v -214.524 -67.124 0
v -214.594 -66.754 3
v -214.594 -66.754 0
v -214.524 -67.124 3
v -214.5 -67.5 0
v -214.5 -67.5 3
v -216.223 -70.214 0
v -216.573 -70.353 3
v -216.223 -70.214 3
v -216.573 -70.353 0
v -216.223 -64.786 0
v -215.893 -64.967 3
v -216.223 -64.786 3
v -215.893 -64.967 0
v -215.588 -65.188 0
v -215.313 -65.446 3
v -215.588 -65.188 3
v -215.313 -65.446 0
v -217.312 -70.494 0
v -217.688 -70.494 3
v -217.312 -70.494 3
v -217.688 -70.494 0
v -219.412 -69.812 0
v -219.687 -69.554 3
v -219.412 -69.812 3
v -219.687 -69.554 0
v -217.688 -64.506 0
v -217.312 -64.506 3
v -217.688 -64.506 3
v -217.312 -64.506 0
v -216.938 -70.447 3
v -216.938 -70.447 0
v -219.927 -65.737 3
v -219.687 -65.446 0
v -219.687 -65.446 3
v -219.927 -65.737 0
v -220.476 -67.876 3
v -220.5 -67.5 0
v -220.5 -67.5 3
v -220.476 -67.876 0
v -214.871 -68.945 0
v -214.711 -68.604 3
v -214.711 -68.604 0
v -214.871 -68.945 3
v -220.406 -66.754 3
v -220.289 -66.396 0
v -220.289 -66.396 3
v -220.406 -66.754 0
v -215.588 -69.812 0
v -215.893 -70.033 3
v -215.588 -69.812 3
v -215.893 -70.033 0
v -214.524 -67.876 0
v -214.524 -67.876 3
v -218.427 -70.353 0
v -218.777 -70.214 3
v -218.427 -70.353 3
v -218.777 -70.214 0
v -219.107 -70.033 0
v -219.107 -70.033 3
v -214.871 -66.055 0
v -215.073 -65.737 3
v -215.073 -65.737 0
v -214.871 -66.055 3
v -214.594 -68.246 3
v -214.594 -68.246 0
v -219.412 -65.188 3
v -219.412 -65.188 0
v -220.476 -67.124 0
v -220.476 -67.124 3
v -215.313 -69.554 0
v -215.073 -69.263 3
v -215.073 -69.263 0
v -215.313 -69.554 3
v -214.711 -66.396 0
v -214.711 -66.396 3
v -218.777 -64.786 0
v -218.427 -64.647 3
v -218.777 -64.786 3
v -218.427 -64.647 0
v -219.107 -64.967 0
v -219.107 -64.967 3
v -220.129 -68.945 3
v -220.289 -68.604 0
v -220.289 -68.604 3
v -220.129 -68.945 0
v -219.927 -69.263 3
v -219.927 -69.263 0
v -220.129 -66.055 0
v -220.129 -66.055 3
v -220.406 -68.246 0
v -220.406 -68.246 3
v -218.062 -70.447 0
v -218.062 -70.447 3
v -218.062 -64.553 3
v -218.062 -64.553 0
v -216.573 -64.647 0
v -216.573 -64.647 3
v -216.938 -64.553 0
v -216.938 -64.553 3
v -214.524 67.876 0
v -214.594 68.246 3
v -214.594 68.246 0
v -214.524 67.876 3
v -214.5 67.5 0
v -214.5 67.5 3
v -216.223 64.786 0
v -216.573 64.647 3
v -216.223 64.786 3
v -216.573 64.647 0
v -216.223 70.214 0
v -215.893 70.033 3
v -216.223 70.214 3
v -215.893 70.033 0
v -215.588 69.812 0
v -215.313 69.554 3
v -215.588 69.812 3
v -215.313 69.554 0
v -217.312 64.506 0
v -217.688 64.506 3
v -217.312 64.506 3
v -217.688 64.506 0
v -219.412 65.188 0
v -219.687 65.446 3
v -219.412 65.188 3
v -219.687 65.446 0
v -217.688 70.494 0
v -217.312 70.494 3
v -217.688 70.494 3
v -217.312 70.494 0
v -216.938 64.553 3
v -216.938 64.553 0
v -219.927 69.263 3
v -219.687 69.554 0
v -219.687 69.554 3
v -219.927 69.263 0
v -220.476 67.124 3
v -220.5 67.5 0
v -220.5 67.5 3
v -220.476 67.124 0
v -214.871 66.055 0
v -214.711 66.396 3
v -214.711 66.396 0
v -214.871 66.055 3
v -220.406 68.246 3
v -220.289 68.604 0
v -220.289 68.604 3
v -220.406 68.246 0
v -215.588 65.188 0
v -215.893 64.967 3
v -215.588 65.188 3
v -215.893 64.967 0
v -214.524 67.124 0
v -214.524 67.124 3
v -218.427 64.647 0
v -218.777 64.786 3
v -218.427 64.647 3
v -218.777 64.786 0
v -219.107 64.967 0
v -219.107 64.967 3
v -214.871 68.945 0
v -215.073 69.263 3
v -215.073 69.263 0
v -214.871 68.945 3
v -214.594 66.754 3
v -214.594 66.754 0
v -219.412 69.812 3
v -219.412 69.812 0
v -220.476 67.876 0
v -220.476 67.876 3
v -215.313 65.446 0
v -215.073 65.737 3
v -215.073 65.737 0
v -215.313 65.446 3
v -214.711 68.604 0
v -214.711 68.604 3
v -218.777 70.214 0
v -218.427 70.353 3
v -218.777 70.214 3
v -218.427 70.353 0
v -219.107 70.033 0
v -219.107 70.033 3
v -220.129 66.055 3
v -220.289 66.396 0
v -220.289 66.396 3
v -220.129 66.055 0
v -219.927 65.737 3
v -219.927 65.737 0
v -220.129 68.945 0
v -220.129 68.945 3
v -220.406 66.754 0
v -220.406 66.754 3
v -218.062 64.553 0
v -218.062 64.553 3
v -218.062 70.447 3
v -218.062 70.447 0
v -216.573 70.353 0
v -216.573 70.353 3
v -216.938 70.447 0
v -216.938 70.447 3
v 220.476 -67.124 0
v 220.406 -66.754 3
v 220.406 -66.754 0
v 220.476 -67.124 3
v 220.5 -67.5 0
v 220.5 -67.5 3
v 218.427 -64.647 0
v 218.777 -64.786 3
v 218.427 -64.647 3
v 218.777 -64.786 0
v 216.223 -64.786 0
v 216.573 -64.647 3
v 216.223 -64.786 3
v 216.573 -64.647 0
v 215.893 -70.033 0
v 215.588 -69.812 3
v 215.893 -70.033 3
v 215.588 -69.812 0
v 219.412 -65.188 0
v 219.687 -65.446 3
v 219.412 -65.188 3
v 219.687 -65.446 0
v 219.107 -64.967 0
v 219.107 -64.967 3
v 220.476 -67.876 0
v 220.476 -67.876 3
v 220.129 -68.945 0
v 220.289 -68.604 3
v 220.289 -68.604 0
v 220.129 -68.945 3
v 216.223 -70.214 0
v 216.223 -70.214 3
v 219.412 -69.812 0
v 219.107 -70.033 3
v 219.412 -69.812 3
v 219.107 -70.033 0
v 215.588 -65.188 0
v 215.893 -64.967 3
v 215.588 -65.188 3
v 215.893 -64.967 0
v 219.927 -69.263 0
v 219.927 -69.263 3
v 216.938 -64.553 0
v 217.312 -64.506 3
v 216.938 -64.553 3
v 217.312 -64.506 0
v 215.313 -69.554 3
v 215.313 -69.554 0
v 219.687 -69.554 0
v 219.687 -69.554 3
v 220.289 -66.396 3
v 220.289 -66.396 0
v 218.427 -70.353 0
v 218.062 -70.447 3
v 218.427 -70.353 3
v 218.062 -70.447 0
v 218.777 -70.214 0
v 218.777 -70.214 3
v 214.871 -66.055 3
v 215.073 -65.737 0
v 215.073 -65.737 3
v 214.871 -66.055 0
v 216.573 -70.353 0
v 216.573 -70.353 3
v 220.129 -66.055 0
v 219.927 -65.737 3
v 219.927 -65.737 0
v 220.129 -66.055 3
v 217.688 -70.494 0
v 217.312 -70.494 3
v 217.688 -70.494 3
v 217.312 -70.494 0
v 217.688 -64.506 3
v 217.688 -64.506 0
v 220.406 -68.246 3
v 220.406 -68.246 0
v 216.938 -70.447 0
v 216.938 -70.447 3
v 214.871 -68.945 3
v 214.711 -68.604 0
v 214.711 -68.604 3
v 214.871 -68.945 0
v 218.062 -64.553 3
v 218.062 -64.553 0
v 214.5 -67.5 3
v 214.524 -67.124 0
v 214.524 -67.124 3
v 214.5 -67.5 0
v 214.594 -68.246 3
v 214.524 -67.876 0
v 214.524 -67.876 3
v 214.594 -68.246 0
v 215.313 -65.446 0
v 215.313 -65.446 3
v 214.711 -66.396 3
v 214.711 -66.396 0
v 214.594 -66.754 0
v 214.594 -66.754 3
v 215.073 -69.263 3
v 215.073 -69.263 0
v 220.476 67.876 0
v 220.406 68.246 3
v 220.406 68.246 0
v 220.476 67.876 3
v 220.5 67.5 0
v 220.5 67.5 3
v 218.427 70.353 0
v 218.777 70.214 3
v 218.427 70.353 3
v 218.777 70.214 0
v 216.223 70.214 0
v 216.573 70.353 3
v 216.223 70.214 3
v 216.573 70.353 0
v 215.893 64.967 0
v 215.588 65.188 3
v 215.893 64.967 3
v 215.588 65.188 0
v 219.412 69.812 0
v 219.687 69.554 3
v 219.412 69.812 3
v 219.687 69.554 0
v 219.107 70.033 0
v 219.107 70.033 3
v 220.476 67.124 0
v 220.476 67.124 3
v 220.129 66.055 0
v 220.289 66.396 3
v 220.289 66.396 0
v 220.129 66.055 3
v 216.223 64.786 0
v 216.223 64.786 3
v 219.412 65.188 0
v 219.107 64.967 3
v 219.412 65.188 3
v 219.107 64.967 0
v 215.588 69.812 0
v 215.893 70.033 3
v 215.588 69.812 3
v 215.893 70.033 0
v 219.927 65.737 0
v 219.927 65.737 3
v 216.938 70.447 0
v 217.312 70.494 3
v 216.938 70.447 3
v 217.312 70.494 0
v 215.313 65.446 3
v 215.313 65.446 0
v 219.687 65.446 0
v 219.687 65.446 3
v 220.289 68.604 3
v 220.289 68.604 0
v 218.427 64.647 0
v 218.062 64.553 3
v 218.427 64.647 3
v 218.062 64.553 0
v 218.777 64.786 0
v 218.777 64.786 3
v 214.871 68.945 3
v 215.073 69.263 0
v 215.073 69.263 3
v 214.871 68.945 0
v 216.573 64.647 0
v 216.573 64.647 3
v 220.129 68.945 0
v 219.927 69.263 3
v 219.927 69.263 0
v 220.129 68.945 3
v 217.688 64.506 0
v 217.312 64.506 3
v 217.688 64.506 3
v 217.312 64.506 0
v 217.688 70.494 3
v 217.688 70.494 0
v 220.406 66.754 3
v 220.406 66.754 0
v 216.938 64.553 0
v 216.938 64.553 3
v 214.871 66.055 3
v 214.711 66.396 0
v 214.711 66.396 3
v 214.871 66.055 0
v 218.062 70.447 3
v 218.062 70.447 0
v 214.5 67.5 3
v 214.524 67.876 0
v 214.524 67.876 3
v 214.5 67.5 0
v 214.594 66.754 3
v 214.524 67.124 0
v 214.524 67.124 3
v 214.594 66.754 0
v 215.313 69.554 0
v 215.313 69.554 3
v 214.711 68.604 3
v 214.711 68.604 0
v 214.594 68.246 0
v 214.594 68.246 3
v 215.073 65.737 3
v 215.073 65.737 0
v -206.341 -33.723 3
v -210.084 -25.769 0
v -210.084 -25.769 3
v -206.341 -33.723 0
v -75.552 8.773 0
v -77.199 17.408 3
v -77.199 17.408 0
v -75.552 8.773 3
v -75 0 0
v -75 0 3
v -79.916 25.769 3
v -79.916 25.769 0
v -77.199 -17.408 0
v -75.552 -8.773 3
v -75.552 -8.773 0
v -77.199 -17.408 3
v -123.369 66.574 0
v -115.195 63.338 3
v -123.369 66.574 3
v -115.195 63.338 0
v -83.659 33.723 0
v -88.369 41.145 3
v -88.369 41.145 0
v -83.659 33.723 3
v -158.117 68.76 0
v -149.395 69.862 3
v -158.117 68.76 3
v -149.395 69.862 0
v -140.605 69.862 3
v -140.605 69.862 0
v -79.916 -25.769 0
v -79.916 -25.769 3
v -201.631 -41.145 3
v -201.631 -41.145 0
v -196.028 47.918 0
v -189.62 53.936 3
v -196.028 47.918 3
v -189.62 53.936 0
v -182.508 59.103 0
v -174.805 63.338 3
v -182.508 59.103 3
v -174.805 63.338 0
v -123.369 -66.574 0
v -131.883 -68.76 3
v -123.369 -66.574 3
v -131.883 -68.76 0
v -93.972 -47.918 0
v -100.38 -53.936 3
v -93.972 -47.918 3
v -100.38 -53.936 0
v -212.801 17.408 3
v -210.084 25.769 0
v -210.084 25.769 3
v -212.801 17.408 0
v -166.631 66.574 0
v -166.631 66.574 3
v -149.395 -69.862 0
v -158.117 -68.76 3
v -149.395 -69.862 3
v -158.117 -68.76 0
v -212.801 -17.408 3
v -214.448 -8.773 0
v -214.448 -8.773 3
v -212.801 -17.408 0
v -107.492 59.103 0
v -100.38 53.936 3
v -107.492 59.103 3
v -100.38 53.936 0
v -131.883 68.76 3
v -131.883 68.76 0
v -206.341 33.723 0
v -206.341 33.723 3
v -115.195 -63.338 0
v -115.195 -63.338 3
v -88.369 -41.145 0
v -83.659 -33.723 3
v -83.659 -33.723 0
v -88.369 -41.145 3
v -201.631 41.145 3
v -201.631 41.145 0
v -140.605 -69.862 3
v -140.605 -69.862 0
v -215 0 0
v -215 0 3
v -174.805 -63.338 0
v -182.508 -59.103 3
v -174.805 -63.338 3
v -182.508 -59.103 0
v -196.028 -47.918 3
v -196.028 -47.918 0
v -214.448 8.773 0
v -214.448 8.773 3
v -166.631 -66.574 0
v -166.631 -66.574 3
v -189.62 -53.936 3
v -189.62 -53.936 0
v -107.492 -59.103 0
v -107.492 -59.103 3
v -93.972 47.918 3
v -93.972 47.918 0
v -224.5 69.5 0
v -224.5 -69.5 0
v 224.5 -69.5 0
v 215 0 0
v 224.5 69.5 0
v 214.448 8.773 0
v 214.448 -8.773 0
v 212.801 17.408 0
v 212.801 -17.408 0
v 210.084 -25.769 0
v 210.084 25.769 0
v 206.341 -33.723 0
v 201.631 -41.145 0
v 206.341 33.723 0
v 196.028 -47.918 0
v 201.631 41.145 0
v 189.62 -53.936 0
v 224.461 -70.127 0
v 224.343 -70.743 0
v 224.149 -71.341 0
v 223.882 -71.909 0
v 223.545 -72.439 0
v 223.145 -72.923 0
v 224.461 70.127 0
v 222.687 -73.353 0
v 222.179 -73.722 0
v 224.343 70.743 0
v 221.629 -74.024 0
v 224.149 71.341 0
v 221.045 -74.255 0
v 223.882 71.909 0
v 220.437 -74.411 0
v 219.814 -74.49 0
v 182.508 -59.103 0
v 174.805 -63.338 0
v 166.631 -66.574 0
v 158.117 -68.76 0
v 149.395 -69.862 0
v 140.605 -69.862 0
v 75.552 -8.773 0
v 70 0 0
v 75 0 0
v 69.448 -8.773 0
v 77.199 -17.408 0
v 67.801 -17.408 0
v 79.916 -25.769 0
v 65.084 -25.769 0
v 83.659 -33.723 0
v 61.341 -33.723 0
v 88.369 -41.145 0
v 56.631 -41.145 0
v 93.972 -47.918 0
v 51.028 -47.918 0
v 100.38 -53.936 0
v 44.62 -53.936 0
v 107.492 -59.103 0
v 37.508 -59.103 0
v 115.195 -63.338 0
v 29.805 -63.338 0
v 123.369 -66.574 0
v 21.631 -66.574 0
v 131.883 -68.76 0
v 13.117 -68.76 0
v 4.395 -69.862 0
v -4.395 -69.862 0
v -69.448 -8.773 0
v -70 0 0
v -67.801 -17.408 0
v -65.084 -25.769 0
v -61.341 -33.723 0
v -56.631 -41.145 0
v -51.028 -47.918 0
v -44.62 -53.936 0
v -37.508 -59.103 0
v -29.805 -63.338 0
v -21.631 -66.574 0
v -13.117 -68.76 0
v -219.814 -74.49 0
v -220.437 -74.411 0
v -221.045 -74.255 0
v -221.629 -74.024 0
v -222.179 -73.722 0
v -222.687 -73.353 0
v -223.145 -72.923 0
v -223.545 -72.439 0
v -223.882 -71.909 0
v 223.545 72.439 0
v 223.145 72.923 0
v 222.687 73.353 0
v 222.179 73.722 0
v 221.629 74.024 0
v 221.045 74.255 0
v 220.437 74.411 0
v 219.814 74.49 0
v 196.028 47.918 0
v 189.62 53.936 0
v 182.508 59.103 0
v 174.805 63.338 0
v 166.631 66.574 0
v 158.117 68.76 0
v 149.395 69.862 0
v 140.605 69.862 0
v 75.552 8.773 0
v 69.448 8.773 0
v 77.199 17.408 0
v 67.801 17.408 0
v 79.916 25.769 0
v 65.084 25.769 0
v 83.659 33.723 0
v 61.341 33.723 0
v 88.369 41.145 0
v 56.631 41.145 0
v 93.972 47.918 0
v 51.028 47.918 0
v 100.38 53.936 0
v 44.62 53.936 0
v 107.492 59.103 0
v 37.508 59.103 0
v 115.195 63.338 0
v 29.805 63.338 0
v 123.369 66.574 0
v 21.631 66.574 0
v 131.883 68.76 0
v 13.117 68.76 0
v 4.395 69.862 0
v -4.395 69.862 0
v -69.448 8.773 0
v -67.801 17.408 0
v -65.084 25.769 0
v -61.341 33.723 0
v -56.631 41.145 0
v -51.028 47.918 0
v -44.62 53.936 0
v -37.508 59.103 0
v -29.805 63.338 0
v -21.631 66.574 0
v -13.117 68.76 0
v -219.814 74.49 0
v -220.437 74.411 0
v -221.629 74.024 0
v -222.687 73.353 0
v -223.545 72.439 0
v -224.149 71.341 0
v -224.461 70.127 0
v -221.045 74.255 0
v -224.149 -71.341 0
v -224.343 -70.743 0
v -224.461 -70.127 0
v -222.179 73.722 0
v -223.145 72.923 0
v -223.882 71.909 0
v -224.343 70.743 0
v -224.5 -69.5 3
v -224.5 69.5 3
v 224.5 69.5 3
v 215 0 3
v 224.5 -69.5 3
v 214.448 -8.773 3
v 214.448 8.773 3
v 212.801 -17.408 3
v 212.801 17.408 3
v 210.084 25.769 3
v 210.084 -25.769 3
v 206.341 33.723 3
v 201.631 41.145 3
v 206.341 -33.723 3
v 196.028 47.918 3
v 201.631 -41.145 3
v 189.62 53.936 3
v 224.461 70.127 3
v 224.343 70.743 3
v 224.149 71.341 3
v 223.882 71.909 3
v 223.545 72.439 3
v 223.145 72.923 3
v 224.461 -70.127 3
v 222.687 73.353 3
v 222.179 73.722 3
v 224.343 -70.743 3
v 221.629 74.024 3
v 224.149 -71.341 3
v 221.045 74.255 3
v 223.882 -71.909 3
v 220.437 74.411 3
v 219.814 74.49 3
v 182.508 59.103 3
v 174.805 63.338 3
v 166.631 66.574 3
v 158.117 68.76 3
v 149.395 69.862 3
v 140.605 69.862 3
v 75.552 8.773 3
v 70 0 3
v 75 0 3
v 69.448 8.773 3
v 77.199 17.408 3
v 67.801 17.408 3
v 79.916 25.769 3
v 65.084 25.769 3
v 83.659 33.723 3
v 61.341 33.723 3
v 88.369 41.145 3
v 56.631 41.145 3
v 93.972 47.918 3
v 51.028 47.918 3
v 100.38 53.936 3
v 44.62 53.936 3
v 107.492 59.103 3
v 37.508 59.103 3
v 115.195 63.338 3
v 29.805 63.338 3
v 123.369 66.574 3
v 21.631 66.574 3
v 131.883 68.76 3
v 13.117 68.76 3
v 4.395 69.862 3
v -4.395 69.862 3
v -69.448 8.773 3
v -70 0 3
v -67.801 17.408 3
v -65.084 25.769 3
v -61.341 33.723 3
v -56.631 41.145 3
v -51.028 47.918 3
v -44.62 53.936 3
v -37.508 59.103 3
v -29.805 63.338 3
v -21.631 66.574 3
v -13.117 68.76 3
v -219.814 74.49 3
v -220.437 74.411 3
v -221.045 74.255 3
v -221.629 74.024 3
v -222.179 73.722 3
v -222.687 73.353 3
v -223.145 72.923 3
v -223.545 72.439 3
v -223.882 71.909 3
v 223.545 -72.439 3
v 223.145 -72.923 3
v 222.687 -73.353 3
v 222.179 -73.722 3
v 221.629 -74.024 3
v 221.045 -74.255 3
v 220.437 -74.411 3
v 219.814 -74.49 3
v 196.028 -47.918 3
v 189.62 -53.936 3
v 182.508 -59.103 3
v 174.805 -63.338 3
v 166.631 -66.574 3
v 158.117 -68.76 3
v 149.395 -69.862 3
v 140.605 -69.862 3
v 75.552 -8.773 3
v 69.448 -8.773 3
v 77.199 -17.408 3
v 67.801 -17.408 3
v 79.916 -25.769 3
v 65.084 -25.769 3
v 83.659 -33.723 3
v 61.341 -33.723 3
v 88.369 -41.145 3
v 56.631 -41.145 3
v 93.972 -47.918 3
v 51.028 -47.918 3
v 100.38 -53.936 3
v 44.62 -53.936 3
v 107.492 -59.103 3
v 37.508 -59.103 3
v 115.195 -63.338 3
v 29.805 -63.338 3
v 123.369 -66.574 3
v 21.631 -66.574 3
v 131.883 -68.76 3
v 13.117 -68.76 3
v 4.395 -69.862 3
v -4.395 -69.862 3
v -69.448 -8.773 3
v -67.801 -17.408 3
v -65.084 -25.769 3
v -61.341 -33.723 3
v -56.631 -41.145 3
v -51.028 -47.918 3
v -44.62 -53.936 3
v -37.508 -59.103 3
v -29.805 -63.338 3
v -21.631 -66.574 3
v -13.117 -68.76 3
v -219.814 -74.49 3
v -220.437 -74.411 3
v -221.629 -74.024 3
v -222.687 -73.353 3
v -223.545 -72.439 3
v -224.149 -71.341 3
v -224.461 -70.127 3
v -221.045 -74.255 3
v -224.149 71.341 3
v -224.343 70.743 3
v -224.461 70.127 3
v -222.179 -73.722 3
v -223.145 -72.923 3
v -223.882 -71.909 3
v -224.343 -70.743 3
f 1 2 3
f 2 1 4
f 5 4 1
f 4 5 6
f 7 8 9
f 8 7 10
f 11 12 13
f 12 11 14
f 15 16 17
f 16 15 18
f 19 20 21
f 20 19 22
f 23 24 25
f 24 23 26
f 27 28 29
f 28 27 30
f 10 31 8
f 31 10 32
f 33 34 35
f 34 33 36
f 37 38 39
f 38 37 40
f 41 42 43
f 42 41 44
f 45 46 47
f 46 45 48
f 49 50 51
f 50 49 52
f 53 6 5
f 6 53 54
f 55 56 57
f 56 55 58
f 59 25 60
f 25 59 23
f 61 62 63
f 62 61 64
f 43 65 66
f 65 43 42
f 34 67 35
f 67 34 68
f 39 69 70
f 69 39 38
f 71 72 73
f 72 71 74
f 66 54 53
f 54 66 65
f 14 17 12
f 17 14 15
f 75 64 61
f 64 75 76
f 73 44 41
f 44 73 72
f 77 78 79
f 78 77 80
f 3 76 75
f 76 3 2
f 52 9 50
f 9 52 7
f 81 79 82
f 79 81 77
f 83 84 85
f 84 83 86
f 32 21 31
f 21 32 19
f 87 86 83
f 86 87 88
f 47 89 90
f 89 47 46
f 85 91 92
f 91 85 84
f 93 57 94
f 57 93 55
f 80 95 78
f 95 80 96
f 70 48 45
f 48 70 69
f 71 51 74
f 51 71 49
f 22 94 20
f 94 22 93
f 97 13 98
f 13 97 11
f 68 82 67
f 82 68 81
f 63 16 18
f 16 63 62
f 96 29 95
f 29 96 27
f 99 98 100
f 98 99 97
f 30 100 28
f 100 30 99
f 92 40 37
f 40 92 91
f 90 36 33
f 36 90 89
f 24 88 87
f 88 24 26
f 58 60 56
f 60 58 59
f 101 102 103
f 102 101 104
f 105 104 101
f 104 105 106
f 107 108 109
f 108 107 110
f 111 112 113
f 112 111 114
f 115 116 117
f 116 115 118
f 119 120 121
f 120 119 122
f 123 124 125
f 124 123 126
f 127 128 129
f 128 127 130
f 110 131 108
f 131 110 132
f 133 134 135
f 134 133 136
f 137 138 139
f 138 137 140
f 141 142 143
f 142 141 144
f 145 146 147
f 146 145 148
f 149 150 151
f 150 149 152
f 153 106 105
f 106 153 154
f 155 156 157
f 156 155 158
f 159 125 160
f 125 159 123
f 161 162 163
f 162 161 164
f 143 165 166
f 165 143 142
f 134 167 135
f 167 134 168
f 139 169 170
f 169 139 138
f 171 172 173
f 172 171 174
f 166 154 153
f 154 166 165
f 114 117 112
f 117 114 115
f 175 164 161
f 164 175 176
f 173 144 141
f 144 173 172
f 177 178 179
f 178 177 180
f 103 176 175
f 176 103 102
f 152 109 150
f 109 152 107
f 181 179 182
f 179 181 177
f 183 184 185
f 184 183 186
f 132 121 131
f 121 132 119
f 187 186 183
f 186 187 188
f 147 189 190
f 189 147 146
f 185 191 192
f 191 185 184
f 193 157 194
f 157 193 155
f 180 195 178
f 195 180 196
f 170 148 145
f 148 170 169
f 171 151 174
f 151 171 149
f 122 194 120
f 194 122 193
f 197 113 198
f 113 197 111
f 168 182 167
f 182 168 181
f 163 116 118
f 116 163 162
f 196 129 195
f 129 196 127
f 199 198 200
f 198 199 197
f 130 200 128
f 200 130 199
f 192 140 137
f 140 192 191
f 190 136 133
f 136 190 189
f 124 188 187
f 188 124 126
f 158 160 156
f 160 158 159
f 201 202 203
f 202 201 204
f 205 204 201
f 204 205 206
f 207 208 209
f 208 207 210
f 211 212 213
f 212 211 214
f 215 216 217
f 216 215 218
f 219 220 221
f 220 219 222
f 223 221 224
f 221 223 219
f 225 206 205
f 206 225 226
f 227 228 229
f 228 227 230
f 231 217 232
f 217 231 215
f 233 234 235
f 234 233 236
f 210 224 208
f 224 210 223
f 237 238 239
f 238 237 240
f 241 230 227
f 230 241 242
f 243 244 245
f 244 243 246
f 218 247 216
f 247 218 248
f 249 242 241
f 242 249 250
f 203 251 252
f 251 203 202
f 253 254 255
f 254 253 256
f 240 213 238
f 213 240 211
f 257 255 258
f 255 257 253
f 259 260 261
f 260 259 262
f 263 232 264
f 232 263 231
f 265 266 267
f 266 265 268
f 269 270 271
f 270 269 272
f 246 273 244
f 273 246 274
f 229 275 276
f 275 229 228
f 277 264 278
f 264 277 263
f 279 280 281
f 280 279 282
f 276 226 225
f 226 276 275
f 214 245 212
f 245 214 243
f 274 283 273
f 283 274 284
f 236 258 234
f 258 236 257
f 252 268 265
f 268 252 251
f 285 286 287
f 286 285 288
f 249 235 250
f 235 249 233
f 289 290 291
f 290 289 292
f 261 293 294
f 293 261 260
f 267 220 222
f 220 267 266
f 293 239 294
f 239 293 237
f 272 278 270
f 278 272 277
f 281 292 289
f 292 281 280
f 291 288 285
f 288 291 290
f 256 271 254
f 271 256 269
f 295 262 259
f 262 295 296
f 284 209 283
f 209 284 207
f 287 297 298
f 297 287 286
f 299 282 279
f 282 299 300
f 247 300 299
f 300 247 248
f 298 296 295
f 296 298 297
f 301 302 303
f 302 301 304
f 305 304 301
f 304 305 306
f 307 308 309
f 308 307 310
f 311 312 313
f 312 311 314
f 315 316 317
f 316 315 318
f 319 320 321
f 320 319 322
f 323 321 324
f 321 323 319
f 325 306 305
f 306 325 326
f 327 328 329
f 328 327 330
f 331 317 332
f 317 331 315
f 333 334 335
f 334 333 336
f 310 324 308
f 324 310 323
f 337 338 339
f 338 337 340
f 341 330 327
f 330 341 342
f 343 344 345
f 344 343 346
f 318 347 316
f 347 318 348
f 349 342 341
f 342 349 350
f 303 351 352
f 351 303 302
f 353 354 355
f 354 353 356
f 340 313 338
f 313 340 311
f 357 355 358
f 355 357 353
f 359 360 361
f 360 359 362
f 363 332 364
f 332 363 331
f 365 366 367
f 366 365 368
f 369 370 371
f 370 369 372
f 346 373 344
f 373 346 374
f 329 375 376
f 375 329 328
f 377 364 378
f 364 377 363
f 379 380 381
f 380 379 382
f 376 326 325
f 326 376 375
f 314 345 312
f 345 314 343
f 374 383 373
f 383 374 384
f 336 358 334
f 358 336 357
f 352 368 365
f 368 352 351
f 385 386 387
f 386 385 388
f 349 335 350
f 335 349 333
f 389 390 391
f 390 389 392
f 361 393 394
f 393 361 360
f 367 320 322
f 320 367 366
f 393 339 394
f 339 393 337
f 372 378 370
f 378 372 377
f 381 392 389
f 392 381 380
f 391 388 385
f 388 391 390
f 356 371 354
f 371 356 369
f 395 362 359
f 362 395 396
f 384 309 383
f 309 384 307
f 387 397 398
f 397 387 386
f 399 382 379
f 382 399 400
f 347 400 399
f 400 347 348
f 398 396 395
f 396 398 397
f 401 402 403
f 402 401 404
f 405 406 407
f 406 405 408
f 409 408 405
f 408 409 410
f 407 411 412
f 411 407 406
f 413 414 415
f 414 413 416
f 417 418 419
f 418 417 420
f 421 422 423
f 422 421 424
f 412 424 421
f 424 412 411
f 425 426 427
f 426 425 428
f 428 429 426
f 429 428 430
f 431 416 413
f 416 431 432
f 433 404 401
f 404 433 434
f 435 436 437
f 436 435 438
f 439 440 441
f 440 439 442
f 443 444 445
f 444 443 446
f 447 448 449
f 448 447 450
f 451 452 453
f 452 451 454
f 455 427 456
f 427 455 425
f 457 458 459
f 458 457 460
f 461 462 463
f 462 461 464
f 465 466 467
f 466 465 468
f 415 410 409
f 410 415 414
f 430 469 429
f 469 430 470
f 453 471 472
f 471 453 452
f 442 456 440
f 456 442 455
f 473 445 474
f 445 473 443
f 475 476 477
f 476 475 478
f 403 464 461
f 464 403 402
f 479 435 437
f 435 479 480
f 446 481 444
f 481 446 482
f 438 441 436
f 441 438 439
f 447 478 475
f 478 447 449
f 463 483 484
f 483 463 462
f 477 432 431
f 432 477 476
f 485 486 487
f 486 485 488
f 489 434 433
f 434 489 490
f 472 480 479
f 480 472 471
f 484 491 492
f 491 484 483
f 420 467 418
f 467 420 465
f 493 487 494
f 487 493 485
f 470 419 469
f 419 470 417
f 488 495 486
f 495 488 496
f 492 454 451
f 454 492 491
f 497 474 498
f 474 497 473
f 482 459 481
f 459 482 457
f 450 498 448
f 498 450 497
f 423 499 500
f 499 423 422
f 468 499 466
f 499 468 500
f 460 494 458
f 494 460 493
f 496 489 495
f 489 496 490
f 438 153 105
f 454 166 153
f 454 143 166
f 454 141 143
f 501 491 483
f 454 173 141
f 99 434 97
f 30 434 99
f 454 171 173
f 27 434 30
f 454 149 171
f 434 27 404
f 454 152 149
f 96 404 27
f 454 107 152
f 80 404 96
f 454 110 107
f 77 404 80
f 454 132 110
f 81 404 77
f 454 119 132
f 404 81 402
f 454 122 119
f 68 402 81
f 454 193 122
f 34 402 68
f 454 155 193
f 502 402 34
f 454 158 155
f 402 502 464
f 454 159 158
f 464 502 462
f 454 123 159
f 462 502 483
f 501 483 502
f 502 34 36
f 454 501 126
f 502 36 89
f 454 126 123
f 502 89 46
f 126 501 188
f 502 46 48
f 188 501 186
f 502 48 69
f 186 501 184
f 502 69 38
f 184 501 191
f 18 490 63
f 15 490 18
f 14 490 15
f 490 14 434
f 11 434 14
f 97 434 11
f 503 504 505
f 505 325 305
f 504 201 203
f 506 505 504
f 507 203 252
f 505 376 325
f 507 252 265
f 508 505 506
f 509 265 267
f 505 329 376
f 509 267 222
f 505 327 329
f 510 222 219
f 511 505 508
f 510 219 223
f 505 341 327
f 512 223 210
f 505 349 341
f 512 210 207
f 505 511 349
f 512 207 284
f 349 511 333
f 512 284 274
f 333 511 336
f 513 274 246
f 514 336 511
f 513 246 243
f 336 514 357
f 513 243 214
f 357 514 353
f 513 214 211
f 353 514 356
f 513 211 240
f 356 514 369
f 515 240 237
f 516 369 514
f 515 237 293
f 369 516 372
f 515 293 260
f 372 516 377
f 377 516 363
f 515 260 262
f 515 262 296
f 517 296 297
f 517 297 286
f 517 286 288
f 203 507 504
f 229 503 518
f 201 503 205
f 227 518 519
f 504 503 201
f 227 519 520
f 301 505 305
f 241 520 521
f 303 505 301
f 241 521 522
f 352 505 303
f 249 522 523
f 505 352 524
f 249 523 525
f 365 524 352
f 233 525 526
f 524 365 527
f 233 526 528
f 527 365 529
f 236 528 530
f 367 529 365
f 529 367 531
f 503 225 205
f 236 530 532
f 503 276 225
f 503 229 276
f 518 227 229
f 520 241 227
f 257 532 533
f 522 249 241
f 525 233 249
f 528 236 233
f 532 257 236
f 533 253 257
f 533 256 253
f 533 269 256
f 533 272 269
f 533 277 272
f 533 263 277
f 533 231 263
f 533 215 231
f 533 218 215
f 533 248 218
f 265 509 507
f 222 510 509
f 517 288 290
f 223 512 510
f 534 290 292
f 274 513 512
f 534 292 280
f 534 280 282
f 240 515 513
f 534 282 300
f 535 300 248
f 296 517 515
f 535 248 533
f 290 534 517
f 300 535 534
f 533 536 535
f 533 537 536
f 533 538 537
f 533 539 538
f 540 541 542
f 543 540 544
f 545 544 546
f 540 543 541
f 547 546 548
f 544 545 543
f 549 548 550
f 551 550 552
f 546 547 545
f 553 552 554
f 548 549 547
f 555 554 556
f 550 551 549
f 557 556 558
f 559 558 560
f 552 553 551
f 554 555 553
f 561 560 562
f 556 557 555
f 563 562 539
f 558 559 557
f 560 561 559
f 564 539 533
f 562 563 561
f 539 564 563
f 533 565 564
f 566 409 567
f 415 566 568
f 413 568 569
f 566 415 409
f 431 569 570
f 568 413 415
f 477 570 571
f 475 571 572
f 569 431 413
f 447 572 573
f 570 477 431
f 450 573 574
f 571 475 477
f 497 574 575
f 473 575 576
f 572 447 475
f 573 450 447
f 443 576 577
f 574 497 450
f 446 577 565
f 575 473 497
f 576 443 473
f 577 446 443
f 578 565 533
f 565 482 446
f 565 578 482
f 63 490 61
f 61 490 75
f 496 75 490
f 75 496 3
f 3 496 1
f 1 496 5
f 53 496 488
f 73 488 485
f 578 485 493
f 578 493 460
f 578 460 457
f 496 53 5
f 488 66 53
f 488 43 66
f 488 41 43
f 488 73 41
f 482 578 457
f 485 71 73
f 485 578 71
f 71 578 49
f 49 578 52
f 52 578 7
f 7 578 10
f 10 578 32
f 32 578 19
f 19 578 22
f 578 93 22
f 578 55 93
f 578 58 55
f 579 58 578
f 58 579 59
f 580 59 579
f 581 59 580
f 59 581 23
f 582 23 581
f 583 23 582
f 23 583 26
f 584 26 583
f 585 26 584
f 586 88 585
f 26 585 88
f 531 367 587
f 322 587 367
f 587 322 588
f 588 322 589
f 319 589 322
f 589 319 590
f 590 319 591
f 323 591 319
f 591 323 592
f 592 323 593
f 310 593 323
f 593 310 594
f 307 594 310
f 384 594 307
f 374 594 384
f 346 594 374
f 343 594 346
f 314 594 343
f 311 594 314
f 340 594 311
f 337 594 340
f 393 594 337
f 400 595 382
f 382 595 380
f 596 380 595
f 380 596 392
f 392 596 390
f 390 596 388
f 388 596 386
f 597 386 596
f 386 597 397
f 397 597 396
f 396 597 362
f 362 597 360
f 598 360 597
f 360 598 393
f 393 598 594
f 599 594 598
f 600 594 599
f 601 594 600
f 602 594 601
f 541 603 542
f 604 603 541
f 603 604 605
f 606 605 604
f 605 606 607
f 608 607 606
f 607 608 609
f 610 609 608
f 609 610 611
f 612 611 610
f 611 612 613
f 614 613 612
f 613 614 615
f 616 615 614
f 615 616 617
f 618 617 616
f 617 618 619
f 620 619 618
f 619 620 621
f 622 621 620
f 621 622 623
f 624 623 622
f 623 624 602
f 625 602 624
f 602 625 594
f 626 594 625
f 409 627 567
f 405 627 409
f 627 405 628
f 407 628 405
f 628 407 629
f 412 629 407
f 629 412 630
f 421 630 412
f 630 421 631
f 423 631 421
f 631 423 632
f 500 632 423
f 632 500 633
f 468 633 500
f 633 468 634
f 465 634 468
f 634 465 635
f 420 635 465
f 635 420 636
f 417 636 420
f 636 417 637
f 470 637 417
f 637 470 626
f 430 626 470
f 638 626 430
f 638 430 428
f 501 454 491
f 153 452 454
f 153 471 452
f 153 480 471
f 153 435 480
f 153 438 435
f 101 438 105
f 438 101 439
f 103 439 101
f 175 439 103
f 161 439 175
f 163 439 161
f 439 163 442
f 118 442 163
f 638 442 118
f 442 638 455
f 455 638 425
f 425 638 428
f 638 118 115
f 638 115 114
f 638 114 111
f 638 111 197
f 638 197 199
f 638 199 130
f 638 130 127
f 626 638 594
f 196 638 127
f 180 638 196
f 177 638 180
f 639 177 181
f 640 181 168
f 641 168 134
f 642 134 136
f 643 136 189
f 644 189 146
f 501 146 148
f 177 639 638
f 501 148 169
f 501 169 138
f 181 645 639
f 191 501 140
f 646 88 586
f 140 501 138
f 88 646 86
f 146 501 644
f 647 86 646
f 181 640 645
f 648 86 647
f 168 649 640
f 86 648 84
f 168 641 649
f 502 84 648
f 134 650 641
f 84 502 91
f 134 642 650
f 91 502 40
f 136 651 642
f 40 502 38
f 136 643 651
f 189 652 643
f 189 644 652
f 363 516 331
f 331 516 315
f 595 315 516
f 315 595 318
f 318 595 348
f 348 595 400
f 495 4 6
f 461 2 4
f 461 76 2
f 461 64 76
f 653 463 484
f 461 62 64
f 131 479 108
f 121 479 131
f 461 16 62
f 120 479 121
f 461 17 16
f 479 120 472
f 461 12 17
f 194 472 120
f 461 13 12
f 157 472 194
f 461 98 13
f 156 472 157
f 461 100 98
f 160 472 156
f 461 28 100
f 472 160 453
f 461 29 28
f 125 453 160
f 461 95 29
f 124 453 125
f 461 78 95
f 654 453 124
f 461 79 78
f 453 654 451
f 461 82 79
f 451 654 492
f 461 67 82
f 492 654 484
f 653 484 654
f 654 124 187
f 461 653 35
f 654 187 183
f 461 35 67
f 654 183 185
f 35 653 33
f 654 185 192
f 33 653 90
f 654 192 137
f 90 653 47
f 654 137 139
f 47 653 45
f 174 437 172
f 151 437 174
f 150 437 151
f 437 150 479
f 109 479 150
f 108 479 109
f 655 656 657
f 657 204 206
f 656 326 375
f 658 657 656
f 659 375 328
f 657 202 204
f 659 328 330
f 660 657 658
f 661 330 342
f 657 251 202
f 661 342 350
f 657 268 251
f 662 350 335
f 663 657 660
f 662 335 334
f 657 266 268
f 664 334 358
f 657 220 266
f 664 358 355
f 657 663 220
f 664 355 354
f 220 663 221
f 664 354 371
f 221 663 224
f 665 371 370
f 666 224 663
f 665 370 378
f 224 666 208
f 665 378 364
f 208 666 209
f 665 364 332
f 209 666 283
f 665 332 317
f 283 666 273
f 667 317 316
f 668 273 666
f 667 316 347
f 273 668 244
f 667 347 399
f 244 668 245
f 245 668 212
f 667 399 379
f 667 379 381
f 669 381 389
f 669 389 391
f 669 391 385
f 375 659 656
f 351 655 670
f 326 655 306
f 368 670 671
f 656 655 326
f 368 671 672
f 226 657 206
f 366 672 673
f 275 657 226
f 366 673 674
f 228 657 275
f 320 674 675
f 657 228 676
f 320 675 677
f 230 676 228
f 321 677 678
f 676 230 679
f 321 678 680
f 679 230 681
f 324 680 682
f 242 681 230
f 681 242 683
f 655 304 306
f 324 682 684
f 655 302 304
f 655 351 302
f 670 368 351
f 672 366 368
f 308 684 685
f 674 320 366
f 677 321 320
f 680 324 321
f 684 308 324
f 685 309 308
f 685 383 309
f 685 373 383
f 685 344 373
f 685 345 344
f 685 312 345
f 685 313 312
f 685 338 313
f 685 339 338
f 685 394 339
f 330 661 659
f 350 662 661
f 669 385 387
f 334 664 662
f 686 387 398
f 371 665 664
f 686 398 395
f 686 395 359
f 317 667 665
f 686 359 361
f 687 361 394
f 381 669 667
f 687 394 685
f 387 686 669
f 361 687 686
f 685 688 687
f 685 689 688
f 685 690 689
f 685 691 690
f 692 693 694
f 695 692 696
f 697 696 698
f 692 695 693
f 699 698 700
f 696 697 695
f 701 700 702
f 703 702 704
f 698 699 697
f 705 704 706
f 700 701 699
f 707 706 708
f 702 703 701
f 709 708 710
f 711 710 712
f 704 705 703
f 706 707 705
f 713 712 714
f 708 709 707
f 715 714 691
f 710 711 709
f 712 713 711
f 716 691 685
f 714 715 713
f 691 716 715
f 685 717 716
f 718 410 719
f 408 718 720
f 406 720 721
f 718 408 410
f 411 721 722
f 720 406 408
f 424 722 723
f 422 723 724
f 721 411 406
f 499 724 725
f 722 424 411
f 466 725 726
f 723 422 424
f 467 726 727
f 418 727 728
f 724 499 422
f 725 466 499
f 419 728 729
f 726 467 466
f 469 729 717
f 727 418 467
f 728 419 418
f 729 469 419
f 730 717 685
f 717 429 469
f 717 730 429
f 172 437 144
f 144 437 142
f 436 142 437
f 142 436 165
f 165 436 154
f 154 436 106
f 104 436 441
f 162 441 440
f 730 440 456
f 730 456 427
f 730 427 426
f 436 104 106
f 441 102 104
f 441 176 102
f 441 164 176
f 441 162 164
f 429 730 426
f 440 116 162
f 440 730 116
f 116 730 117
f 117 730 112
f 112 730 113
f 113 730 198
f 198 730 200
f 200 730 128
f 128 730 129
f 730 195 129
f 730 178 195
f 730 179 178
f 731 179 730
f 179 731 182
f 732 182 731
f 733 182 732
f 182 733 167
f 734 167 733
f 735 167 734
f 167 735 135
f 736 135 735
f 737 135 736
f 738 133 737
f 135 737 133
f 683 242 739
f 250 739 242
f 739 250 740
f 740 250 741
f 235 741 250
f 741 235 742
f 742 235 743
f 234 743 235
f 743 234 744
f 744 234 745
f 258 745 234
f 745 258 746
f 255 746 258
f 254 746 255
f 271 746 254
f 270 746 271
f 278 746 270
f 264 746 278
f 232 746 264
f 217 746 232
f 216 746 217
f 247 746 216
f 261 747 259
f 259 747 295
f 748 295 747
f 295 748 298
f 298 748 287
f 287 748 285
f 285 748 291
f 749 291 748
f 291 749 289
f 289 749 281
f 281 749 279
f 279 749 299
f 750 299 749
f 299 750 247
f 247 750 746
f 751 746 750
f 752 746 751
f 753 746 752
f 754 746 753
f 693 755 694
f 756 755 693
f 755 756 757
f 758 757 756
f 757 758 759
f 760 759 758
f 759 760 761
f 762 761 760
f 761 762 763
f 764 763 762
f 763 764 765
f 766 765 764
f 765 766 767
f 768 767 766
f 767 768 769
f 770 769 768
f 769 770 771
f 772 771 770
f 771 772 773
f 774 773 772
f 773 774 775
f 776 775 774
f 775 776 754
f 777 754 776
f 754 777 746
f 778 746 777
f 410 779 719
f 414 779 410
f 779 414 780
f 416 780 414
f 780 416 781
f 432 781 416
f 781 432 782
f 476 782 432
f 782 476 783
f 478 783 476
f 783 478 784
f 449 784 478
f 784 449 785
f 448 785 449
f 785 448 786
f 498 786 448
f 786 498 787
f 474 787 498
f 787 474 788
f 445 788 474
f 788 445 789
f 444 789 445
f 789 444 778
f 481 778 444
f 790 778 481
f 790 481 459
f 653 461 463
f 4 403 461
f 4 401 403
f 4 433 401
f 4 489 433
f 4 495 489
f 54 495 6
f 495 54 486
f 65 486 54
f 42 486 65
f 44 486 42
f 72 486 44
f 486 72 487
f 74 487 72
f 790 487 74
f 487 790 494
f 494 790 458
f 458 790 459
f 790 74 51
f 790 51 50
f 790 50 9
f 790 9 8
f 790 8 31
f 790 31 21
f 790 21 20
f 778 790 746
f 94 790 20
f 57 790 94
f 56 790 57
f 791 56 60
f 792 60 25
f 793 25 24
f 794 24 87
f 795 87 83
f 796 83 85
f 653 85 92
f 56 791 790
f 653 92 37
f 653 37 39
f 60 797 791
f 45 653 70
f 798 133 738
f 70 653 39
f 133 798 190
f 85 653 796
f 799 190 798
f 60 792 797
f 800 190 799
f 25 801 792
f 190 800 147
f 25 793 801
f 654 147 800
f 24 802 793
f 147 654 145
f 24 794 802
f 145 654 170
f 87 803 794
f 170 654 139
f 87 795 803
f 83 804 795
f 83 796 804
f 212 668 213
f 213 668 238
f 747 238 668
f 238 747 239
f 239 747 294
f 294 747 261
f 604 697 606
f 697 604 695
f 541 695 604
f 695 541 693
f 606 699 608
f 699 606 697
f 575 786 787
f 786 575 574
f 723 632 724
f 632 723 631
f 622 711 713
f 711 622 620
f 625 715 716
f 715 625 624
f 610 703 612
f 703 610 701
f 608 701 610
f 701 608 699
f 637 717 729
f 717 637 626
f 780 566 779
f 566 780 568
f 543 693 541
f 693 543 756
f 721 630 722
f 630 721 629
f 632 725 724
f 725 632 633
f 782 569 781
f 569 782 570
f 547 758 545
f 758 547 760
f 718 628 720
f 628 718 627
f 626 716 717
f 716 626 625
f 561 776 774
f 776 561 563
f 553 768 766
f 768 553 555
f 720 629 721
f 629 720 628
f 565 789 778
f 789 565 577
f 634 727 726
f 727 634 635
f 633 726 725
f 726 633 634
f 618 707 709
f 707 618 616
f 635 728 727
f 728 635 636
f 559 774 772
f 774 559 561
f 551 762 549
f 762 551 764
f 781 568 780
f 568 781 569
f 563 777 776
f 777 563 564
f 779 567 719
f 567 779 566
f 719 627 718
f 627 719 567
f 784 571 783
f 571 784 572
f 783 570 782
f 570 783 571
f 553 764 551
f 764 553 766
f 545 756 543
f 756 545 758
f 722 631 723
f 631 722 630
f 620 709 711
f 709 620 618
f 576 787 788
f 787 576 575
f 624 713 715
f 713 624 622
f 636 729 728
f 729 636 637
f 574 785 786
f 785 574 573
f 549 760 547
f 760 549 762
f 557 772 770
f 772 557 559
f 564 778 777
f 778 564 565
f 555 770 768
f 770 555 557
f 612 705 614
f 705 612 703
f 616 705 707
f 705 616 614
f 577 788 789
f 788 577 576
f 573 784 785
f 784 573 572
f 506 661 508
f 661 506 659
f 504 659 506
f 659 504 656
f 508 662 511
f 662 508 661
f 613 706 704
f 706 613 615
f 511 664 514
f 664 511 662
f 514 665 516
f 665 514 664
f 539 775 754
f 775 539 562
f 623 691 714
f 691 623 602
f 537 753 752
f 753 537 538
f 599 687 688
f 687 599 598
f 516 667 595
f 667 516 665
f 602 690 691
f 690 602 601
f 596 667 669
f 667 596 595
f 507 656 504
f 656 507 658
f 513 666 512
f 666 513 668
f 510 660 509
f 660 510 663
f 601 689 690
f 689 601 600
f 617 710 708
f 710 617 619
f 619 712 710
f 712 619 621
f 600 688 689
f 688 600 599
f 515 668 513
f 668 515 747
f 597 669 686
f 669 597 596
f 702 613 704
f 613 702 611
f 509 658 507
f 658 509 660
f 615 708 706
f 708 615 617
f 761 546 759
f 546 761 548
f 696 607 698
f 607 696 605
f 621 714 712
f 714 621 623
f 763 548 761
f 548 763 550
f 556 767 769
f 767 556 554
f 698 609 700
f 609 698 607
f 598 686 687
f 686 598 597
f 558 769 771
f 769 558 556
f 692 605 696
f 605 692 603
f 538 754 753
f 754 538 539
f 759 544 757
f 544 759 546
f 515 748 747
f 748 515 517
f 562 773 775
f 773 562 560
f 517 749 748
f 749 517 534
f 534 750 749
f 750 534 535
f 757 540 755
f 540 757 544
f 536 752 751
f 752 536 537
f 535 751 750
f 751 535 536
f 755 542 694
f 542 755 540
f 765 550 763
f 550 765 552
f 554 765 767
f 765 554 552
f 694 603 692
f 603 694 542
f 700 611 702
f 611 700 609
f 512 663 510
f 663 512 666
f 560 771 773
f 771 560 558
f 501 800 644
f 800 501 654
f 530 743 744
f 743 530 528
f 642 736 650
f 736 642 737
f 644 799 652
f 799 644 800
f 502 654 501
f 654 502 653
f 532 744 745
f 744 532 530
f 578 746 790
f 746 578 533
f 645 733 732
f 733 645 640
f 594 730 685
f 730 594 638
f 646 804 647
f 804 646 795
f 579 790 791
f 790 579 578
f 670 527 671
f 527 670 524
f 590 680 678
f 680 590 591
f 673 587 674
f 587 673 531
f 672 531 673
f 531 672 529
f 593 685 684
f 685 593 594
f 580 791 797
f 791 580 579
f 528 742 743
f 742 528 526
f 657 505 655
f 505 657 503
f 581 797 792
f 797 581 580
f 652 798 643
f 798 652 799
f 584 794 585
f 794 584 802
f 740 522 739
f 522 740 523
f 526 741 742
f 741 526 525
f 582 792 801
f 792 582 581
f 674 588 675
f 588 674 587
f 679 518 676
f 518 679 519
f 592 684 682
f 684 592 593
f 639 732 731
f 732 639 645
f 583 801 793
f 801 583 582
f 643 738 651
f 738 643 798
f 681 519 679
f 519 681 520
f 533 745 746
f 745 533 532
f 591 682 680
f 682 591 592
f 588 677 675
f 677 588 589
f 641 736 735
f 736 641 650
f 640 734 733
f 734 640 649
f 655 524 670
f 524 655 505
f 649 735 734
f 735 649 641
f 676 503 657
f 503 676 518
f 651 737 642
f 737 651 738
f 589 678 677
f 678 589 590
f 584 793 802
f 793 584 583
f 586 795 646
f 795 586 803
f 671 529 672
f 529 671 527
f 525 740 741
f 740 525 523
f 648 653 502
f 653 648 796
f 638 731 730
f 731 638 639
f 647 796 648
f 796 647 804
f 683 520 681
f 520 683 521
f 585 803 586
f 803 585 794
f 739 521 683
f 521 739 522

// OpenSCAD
$fn = 50;


difference() {
	union() {
		hull() {
			translate(v = [-219.5000000000, 69.5000000000, 0]) {
				cylinder(h = 3, r = 5);
			}
			translate(v = [219.5000000000, 69.5000000000, 0]) {
				cylinder(h = 3, r = 5);
			}
			translate(v = [-219.5000000000, -69.5000000000, 0]) {
				cylinder(h = 3, r = 5);
			}
			translate(v = [219.5000000000, -69.5000000000, 0]) {
				cylinder(h = 3, r = 5);
			}
		}
	}
	union() {
		#translate(v = [-217.5000000000, -67.5000000000, -100.0000000000]) {
			cylinder(h = 200, r = 3.0000000000);
		}
		#translate(v = [-217.5000000000, 67.5000000000, -100.0000000000]) {
			cylinder(h = 200, r = 3.0000000000);
		}
		#translate(v = [217.5000000000, -67.5000000000, -100.0000000000]) {
			cylinder(h = 200, r = 3.0000000000);
		}
		#translate(v = [217.5000000000, 67.5000000000, -100.0000000000]) {
			cylinder(h = 200, r = 3.0000000000);
		}
		#translate(v = [-145.0000000000, 0, 0]) {
			cylinder(h = 3, r = 70.0000000000);
		}
		#cylinder(h = 3, r = 70.0000000000);
		#translate(v = [145.0000000000, 0, 0]) {
			cylinder(h = 3, r = 70.0000000000);
		}
	}
}
